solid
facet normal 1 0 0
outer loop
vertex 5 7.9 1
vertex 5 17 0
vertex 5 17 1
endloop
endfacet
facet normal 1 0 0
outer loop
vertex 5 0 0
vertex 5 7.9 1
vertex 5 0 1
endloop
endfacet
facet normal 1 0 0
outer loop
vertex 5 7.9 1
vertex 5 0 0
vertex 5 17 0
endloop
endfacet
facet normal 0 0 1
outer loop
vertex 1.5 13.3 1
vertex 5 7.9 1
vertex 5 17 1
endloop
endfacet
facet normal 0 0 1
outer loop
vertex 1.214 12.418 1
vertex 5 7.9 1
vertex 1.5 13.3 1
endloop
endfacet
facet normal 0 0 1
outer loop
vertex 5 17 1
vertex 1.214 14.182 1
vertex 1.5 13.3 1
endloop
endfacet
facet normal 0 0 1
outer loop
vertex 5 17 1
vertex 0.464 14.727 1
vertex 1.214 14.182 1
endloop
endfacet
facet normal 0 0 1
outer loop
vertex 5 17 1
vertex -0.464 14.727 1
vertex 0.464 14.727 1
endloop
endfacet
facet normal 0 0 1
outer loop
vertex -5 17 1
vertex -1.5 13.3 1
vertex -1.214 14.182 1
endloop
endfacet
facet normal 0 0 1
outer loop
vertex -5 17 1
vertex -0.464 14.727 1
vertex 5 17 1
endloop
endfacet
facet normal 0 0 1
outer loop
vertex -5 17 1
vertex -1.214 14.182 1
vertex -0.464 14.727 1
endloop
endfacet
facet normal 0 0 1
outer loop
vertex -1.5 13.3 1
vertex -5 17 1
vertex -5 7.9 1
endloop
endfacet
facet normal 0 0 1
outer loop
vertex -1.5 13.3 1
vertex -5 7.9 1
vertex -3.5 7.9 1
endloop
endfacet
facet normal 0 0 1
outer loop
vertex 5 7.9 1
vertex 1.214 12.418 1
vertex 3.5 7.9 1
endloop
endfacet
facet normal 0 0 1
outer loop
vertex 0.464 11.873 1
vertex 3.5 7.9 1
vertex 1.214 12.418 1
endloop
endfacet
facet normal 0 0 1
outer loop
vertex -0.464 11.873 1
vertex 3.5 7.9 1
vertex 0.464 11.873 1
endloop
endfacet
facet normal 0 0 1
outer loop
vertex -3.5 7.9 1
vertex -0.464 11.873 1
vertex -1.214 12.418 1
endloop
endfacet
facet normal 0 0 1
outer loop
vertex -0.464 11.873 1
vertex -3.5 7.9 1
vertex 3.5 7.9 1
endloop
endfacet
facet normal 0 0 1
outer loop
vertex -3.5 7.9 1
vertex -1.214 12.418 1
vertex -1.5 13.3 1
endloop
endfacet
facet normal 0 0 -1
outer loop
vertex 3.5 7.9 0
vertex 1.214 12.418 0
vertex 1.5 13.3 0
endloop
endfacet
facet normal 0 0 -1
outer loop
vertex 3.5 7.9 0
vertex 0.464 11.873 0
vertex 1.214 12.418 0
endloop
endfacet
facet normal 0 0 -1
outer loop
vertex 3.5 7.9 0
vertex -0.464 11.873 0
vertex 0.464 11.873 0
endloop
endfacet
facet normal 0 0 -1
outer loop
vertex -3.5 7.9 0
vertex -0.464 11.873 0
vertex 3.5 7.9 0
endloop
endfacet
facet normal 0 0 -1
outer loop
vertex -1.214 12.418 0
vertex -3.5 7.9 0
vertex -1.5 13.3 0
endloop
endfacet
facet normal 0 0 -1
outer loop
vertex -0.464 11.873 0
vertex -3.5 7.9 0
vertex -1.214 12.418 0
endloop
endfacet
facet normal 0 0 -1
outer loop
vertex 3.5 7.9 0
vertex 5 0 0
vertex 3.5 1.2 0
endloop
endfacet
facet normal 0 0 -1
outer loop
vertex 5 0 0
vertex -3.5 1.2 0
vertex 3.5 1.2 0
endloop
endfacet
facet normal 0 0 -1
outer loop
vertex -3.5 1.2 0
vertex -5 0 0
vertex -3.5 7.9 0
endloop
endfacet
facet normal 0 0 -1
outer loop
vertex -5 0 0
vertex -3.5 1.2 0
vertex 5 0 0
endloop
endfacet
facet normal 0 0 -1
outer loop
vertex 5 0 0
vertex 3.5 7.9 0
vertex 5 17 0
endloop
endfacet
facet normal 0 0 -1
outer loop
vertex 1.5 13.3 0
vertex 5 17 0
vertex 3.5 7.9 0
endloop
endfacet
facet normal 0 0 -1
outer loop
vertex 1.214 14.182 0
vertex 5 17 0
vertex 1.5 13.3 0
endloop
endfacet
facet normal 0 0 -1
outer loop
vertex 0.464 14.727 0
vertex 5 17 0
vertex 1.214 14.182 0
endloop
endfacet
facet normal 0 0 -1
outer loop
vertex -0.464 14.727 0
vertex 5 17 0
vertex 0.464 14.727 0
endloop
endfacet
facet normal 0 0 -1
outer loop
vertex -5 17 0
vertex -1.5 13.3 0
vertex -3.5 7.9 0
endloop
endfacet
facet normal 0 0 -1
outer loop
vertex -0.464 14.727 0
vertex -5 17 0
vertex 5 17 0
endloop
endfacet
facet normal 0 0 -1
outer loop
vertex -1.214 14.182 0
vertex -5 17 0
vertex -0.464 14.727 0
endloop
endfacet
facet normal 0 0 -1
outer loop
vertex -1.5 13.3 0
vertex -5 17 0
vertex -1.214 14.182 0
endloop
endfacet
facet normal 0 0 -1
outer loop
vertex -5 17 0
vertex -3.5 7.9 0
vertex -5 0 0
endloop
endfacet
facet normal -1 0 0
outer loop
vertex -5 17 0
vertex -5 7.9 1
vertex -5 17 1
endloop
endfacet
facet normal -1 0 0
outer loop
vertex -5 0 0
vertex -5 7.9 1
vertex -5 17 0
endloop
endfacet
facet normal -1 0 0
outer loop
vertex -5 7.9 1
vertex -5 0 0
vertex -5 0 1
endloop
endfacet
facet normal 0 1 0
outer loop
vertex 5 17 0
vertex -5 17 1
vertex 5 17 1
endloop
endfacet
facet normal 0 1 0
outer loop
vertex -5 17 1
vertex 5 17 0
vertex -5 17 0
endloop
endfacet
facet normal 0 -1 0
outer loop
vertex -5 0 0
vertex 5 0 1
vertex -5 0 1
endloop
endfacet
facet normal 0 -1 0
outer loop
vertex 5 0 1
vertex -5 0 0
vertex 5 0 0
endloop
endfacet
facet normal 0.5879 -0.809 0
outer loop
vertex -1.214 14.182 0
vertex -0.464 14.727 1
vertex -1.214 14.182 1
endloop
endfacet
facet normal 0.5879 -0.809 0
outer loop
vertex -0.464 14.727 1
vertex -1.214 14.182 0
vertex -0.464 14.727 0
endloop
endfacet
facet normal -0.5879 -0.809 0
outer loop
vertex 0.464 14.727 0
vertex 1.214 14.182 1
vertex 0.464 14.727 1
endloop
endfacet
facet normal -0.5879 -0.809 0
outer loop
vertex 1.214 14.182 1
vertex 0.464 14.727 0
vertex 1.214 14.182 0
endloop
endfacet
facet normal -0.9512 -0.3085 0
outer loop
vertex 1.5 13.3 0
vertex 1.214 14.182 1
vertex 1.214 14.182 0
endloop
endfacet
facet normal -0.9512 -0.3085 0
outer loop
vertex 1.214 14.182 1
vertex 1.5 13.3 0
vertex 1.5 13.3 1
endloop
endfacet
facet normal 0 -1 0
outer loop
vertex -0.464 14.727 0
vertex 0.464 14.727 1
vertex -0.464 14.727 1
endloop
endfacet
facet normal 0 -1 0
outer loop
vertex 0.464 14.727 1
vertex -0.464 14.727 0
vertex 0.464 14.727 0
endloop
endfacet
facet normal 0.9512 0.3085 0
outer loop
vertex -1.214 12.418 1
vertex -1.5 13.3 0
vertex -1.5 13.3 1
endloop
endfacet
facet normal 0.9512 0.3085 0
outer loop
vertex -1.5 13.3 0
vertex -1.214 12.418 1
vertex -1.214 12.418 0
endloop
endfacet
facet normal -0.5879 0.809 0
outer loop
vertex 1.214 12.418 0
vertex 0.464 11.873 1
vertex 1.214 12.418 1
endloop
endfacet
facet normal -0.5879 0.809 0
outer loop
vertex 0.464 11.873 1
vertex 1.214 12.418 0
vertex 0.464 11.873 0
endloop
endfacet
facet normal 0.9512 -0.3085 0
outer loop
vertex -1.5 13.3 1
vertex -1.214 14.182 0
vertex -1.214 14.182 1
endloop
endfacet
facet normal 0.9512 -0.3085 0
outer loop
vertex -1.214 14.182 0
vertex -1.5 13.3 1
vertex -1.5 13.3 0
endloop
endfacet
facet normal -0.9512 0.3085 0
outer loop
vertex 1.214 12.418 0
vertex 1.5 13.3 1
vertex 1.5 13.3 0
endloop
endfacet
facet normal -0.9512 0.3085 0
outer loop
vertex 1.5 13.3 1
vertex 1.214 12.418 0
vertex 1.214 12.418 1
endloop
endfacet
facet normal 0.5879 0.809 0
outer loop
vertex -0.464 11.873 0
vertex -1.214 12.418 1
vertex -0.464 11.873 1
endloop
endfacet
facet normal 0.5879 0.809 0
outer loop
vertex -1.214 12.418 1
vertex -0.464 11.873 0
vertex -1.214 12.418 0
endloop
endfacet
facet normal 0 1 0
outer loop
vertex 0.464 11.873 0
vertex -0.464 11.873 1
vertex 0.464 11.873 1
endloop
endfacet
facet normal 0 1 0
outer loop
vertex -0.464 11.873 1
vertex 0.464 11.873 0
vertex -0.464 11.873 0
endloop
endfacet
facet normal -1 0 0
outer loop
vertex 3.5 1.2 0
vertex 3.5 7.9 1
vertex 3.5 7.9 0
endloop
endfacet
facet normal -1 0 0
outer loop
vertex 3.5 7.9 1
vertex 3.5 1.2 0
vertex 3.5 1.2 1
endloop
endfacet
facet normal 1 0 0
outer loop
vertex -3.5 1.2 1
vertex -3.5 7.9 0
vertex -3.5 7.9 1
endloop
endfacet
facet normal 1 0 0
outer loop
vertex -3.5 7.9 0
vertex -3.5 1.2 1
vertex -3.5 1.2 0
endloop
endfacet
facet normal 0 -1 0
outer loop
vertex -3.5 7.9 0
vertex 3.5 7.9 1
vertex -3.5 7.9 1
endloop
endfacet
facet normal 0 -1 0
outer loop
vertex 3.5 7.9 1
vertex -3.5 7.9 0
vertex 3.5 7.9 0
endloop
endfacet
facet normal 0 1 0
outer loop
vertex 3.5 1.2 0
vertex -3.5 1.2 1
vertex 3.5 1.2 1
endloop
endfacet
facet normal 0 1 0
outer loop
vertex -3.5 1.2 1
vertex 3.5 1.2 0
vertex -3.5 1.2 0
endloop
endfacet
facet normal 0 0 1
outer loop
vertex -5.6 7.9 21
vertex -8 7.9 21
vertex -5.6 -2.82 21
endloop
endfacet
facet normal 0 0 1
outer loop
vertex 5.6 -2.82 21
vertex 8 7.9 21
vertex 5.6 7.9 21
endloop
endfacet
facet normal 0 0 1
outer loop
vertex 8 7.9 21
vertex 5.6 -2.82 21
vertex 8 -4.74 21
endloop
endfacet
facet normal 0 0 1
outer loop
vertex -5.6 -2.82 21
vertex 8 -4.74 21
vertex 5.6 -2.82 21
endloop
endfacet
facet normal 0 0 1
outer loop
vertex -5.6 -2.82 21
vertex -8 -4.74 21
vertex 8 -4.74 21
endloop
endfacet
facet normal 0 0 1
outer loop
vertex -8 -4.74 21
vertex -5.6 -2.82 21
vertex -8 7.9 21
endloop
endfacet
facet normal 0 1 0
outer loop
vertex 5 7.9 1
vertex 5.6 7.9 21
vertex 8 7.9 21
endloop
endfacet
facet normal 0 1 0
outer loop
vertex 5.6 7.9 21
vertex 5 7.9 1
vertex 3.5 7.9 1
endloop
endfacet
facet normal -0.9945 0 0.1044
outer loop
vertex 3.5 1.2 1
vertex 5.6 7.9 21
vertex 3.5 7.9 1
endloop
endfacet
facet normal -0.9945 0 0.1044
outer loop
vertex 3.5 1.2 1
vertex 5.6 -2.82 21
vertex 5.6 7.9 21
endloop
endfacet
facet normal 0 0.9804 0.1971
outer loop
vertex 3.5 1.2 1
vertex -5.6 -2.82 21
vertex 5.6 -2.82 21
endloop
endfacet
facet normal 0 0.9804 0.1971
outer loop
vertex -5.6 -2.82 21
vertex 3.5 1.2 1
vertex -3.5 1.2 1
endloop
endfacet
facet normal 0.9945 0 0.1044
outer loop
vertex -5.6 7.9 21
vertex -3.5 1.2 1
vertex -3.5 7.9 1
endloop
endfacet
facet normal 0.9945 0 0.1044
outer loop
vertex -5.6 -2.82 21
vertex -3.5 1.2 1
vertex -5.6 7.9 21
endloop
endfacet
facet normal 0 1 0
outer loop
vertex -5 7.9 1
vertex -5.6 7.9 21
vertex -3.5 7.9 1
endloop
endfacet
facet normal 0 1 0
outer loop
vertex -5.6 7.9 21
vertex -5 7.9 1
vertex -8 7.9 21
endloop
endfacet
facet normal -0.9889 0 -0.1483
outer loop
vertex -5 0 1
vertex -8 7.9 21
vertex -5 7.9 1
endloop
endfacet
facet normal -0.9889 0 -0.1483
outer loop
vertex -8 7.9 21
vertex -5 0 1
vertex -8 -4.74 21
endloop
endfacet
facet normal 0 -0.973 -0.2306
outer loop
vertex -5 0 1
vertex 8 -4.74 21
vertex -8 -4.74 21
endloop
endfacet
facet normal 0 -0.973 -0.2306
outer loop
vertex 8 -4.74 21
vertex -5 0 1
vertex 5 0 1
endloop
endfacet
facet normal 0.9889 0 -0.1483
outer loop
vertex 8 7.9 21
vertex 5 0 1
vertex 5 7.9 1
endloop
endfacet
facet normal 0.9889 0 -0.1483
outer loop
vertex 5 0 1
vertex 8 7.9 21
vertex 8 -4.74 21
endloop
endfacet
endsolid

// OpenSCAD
// file: ../Lib/Parenting.scad
module parentBy(node) {
  rotate([0, 0, node[1][2]])
  rotate([node[1][0], node[1][1], 0])
  translate(node[0]) {
    children();
  }
}
// main file
/*
    LF-Sensor shielding to increase precision of the sensors despite their ... quality.
    Created on 11.12.15, @Xasin
*/

use <../Lib/Parenting.scad>

baseThickness = 1;
holePosition = 13.3;

basePosition = [[0, 0, baseThickness], 0];


sensorYSize = 6.7;
sensorXSize = 7;

sensorYDistance = 1.2;
sensorXDistance = 2;

module base() {
  difference() {
      translate([-5, 0, 0]) cube([10, 17, baseThickness]);

      translate([0, holePosition, -0.001]) cylinder(r=3/2, h=baseThickness + 1, $fn = 10);

      translate([-sensorXSize/2, sensorYDistance, -0.001]) cube([sensorXSize, sensorYSize, baseThickness + 1]);
  }
}

shieldingHeight = 20;
shieldingScale = 1.6;

module shieldShape() {
  difference() {
    translate([-5, 0]) square([10, sensorYDistance + sensorYSize]);

    translate([-sensorXSize/2, sensorYDistance]) square([sensorXSize, sensorYSize]);
  }
}

module shield() {
  translate([0, sensorYSize + sensorYDistance, 0]) linear_extrude(height = shieldingHeight, scale = shieldingScale) {
    translate([0, -sensorYSize - sensorYDistance, 0]) shieldShape();
  }
}

base();
parentBy(basePosition) shield();
